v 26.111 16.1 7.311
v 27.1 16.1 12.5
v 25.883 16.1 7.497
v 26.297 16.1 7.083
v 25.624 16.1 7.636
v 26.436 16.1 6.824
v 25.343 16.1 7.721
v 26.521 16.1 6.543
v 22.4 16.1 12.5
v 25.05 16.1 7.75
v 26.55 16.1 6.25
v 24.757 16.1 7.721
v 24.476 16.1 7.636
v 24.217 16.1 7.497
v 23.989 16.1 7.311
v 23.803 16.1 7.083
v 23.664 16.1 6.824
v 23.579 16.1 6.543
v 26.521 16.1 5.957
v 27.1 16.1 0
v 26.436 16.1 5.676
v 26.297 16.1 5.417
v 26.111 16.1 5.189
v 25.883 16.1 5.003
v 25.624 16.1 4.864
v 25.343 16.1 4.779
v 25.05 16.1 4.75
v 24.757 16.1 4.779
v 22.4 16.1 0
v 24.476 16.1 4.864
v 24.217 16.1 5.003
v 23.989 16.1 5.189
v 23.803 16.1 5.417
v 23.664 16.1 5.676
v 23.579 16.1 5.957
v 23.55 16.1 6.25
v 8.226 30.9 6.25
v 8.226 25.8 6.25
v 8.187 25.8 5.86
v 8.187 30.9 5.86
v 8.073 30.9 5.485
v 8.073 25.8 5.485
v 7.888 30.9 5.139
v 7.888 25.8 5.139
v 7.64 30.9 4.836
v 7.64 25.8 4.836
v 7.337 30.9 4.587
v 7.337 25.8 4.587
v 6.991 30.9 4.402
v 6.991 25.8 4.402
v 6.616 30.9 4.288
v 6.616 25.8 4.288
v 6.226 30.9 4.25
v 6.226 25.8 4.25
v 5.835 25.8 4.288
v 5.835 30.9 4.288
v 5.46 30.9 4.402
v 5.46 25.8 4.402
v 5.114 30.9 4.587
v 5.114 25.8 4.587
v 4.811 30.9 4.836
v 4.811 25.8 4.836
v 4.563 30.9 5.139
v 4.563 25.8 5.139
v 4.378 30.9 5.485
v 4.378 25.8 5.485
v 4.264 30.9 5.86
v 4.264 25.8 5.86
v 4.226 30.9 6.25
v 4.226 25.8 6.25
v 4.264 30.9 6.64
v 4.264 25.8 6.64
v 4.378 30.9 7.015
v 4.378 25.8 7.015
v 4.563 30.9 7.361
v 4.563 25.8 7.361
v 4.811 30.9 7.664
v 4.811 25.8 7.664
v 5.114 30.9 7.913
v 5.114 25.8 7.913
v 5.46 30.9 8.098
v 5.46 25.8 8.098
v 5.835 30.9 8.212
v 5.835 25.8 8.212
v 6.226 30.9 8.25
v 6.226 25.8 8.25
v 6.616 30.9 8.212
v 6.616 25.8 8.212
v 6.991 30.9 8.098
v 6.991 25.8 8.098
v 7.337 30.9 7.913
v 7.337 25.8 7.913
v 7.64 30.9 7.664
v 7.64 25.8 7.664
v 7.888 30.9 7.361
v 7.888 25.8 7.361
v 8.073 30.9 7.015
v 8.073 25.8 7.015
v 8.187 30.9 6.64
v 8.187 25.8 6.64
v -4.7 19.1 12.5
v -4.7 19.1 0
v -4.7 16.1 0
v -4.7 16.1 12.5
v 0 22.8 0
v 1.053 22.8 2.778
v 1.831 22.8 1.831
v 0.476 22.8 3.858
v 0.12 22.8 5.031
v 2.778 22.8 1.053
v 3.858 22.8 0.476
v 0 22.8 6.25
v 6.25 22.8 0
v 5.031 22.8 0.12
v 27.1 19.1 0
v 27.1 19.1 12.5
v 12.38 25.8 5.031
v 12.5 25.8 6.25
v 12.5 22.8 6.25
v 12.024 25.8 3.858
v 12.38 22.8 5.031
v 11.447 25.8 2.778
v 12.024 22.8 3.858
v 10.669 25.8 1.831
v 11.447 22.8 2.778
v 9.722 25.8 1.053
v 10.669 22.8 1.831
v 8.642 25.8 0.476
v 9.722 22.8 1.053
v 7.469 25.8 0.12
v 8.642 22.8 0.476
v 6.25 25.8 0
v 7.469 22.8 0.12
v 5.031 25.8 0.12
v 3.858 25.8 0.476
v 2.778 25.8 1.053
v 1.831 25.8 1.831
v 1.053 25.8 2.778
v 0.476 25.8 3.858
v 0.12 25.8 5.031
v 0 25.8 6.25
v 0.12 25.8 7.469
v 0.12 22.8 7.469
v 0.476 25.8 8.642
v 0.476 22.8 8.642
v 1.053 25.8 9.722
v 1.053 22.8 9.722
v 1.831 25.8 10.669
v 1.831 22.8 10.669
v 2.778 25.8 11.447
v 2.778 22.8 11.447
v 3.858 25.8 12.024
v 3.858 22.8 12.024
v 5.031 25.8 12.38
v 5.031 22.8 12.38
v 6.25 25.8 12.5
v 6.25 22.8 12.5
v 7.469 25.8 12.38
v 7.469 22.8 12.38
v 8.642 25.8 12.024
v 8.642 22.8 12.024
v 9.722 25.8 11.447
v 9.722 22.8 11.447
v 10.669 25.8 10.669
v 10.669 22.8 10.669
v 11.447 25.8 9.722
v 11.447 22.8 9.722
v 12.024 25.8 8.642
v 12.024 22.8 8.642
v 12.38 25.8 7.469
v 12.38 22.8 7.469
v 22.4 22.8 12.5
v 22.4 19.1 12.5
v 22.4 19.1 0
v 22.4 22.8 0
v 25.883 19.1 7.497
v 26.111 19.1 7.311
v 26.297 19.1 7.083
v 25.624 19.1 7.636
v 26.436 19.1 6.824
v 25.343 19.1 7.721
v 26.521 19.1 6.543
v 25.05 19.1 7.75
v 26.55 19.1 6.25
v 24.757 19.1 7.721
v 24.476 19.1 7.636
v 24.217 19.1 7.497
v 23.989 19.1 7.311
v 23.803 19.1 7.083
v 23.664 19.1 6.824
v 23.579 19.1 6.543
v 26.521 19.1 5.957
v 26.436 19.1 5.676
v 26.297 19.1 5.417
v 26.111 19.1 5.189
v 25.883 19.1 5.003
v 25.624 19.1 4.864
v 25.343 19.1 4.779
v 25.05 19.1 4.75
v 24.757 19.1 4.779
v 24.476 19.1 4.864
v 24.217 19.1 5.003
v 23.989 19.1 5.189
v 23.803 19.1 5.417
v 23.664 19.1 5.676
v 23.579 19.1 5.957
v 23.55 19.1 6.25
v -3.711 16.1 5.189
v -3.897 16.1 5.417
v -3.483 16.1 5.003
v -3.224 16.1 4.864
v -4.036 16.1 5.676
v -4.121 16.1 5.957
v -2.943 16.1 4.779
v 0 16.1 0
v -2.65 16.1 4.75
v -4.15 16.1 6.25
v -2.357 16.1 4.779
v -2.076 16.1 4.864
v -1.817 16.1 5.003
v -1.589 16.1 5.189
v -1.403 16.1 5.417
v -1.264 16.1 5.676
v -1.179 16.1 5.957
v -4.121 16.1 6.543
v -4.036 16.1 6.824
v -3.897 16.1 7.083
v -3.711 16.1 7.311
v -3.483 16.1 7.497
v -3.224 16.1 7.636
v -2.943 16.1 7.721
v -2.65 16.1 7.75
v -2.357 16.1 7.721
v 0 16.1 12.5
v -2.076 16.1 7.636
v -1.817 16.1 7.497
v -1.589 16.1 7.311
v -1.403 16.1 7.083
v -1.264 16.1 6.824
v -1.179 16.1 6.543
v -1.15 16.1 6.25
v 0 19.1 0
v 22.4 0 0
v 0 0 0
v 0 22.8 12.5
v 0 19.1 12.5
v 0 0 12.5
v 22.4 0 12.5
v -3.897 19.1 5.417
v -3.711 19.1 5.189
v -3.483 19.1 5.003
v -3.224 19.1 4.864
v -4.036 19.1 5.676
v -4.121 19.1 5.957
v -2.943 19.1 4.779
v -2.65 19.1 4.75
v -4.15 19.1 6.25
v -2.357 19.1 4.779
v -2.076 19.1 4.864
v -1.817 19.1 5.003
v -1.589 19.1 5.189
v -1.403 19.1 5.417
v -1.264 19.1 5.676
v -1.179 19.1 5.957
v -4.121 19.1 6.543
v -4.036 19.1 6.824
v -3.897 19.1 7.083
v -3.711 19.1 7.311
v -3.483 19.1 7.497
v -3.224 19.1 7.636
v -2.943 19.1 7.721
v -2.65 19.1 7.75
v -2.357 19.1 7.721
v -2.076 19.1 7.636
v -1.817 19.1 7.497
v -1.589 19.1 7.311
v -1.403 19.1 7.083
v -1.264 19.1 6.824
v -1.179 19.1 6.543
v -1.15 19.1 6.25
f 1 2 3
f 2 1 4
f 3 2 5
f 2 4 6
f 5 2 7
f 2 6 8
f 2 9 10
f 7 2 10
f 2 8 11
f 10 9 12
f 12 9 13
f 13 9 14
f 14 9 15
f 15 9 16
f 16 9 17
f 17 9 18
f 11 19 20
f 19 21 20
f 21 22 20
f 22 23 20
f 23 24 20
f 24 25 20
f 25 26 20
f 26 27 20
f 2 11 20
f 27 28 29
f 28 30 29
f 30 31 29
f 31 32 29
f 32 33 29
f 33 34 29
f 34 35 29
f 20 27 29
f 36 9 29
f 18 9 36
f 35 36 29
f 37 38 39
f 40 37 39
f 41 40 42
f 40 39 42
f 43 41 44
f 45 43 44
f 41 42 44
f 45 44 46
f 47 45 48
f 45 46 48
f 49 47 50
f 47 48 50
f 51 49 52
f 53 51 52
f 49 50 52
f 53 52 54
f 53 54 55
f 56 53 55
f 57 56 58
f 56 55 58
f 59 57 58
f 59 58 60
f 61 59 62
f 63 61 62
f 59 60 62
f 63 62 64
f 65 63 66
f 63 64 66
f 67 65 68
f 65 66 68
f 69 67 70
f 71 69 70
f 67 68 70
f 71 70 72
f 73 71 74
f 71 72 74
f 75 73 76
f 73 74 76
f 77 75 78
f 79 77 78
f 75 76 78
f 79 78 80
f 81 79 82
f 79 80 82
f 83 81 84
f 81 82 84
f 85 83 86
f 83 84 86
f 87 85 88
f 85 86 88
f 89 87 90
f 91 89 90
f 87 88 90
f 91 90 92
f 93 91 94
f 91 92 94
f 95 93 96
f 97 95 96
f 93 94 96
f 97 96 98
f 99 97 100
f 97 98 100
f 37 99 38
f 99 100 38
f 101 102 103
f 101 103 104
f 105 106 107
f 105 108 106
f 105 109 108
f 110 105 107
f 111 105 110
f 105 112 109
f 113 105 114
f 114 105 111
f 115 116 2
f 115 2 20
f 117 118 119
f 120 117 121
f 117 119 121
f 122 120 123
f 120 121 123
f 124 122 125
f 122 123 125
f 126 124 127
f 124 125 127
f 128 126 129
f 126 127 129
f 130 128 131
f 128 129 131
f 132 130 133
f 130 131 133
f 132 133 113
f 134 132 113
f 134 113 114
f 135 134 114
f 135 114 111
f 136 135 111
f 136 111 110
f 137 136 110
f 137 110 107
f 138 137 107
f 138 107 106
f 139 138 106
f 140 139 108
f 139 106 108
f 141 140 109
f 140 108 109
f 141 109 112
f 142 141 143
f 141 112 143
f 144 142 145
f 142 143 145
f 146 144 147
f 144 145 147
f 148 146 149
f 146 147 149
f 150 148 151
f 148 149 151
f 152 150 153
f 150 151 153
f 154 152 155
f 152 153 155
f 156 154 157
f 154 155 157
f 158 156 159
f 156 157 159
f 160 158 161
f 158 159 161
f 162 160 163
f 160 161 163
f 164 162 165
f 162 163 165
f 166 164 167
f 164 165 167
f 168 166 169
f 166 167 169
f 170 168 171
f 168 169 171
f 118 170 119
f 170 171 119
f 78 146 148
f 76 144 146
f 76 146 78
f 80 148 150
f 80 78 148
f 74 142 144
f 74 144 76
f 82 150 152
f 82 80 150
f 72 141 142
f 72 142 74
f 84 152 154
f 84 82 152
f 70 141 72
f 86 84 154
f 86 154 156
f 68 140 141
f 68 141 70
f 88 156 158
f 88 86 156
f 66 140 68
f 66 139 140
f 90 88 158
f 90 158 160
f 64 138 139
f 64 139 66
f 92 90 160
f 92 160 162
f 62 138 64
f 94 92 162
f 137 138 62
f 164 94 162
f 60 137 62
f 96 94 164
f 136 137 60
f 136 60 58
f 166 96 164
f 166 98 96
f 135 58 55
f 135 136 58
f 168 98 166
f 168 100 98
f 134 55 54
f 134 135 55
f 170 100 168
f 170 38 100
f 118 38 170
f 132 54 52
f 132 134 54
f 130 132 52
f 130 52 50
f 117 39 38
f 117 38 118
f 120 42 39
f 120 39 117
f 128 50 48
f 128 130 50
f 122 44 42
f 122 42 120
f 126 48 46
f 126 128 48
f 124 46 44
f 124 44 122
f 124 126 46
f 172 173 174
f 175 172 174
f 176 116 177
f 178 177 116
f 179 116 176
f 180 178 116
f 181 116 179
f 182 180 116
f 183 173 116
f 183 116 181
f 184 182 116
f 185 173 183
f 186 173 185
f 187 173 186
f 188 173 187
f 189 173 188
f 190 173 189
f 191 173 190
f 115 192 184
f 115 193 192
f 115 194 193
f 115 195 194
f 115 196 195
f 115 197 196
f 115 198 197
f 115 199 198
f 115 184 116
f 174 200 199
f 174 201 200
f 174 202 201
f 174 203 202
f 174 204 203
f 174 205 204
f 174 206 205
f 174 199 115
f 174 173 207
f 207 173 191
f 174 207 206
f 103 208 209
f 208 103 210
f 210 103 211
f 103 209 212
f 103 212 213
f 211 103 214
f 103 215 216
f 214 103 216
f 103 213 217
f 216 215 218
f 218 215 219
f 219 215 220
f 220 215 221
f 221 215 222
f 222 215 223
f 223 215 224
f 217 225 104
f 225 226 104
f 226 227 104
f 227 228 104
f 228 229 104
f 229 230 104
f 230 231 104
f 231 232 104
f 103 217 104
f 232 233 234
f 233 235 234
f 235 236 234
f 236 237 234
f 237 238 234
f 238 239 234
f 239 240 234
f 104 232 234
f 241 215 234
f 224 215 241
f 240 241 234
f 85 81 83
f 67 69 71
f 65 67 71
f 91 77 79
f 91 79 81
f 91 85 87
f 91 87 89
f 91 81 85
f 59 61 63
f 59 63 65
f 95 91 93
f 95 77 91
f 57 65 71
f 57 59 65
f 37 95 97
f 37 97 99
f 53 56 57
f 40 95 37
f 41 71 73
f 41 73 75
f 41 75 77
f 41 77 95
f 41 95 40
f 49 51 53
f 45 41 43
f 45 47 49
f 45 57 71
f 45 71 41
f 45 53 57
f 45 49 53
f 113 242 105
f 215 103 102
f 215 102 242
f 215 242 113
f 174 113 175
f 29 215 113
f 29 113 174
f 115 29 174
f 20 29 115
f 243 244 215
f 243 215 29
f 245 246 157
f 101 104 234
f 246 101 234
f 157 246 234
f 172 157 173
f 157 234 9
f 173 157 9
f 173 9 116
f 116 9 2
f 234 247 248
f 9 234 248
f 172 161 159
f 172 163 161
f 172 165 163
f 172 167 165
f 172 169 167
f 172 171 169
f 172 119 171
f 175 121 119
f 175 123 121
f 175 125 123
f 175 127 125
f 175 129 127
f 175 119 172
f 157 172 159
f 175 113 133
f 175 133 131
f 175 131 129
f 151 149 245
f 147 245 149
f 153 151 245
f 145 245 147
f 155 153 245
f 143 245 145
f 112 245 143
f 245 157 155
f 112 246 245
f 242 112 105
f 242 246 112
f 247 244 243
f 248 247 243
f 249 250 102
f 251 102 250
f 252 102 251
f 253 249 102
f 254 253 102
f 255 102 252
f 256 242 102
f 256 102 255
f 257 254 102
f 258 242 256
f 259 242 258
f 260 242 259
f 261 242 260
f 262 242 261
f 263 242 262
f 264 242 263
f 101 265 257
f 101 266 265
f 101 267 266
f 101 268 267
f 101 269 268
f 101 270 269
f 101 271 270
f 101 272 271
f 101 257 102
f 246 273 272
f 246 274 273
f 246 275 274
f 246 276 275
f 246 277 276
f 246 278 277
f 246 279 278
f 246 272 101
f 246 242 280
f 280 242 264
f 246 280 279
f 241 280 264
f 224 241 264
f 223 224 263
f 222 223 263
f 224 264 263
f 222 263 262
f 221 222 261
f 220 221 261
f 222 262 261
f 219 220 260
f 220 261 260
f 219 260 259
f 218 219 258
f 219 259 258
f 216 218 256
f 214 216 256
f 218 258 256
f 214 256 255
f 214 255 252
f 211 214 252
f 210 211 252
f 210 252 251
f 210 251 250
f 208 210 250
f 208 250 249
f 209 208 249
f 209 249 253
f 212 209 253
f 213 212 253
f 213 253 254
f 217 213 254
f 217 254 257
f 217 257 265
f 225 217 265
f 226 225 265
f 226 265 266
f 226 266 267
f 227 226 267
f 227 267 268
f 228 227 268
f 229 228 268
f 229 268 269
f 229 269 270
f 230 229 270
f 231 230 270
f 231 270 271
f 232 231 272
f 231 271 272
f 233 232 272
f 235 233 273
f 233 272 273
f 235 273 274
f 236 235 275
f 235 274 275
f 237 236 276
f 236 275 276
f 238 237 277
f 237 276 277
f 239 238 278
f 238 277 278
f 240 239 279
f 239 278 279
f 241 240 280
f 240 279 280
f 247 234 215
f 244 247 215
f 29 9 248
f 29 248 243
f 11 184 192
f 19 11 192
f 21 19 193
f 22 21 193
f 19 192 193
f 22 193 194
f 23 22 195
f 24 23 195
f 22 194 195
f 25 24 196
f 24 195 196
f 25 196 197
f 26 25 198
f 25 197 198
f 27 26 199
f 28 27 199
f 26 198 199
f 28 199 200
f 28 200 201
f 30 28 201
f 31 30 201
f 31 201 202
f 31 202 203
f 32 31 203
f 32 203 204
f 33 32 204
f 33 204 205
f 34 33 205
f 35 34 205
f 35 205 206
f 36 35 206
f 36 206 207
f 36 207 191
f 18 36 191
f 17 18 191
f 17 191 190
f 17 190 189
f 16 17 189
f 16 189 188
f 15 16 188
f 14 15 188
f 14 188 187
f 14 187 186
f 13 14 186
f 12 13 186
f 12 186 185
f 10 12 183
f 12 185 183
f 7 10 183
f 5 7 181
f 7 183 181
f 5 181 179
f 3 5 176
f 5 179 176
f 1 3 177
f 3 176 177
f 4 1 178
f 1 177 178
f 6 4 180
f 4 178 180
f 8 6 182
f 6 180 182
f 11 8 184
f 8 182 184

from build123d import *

# Parameters (mm, degrees)
SKETCH_1_W          = 22.4
SKETCH_1_H          = 12.5
EXTRUDE_1_DEPTH     = 22.8
SKETCH_2_W          = 12.5
SKETCH_2_H          = 3
EXTRUDE_2_DEPTH     = 4.7
SKETCH_3_W          = 12.5
SKETCH_3_H          = 3
EXTRUDE_3_DEPTH     = 4.7
SKETCH_4_R          = 1.5
CUT_EXTRUDE_1_DEPTH = 4.7
SKETCH_5_R          = 6.25
EXTRUDE_5_DEPTH     = 3
SKETCH_6_R          = 2
EXTRUDE_6_DEPTH     = 5.1


with BuildPart() as part:
    # 草图1 → 凸台-拉伸1 (new body)
    with BuildSketch(Plane(origin=(0, 0, 0), x_dir=(1, 0, 0), z_dir=(0, 1, 0))):
        with Locations((11.2, -6.25)):
            Rectangle(SKETCH_1_W, SKETCH_1_H)
    extrude(amount=EXTRUDE_1_DEPTH)

    # 草图2 → 凸台-拉伸2 (add)
    with BuildSketch(Plane(origin=(22.4, 0, 0), x_dir=(0, 0, -1), z_dir=(1, 0, 0))):
        with Locations((-6.25, 17.6)):
            Rectangle(SKETCH_2_W, SKETCH_2_H)
    extrude(amount=EXTRUDE_2_DEPTH)

    # 草图3 → 凸台-拉伸3 (add)
    with BuildSketch(Plane.ZY):
        with Locations((6.25, 17.6)):
            Rectangle(SKETCH_3_W, SKETCH_3_H)
    extrude(amount=EXTRUDE_3_DEPTH)

    # 草图4 → 切除-拉伸1 (cut)
    with BuildSketch(Plane(origin=(0, 19.1, 0), x_dir=(1, 0, 0), z_dir=(0, 1, 0))):
        with Locations((-2.65, -6.25)):
            Circle(SKETCH_4_R)
        with Locations((25.05, -6.25)):
            Circle(SKETCH_4_R)
    extrude(amount=-CUT_EXTRUDE_1_DEPTH, mode=Mode.SUBTRACT)

    # 草图5 → 凸台-拉伸5 (add)
    with BuildSketch(Plane(origin=(0, 22.8, 0), x_dir=(1, 0, 0), z_dir=(0, 1, 0))):
        with Locations((6.25, -6.25)):
            Circle(SKETCH_5_R)
    extrude(amount=EXTRUDE_5_DEPTH)

    # 草图6 → 凸台-拉伸6 (add)
    with BuildSketch(Plane(origin=(0, 25.8, 0), x_dir=(1, 0, 0), z_dir=(0, 1, 0))):
        with Locations((6.225516092, -6.25)):
            Circle(SKETCH_6_R)
    extrude(amount=EXTRUDE_6_DEPTH)


solid = part.part
